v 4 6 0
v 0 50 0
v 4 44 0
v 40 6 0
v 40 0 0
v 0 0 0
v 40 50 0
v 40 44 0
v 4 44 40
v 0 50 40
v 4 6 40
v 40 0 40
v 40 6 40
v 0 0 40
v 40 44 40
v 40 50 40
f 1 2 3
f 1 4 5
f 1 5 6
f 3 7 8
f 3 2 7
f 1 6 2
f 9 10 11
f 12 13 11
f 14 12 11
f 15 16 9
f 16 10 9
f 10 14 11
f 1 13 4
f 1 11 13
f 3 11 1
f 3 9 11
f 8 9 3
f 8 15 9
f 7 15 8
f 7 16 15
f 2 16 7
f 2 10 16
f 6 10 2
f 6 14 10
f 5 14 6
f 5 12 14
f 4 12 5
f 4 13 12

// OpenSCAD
$fn = 32;

// ----------------------------------------------------------------------
// Structural section: channel 40 x 50 mm
// ----------------------------------------------------------------------

// --- parameters (mm) ---
sec_w = 40;               // channel width, X
sec_h = 50;               // channel height, Y
flange_t = 6;             // flange thickness
web_t = 4;                // web thickness
plate_t = 40;             // cut length, Z (extrusion height)
fit_tol = 0.1;            // declared fit tolerance (prompt contract)
free_tol = 0.3;           // declared free tolerance (prompt contract)

profile = [[0, 0], [40, 0], [40, 6], [4, 6], [4, 44], [40, 44], [40, 50], [0, 50]];  // primary outline, 8 points, counter clockwise

// --- the one profile operation ---
linear_extrude(height = plate_t) polygon(points = profile);
